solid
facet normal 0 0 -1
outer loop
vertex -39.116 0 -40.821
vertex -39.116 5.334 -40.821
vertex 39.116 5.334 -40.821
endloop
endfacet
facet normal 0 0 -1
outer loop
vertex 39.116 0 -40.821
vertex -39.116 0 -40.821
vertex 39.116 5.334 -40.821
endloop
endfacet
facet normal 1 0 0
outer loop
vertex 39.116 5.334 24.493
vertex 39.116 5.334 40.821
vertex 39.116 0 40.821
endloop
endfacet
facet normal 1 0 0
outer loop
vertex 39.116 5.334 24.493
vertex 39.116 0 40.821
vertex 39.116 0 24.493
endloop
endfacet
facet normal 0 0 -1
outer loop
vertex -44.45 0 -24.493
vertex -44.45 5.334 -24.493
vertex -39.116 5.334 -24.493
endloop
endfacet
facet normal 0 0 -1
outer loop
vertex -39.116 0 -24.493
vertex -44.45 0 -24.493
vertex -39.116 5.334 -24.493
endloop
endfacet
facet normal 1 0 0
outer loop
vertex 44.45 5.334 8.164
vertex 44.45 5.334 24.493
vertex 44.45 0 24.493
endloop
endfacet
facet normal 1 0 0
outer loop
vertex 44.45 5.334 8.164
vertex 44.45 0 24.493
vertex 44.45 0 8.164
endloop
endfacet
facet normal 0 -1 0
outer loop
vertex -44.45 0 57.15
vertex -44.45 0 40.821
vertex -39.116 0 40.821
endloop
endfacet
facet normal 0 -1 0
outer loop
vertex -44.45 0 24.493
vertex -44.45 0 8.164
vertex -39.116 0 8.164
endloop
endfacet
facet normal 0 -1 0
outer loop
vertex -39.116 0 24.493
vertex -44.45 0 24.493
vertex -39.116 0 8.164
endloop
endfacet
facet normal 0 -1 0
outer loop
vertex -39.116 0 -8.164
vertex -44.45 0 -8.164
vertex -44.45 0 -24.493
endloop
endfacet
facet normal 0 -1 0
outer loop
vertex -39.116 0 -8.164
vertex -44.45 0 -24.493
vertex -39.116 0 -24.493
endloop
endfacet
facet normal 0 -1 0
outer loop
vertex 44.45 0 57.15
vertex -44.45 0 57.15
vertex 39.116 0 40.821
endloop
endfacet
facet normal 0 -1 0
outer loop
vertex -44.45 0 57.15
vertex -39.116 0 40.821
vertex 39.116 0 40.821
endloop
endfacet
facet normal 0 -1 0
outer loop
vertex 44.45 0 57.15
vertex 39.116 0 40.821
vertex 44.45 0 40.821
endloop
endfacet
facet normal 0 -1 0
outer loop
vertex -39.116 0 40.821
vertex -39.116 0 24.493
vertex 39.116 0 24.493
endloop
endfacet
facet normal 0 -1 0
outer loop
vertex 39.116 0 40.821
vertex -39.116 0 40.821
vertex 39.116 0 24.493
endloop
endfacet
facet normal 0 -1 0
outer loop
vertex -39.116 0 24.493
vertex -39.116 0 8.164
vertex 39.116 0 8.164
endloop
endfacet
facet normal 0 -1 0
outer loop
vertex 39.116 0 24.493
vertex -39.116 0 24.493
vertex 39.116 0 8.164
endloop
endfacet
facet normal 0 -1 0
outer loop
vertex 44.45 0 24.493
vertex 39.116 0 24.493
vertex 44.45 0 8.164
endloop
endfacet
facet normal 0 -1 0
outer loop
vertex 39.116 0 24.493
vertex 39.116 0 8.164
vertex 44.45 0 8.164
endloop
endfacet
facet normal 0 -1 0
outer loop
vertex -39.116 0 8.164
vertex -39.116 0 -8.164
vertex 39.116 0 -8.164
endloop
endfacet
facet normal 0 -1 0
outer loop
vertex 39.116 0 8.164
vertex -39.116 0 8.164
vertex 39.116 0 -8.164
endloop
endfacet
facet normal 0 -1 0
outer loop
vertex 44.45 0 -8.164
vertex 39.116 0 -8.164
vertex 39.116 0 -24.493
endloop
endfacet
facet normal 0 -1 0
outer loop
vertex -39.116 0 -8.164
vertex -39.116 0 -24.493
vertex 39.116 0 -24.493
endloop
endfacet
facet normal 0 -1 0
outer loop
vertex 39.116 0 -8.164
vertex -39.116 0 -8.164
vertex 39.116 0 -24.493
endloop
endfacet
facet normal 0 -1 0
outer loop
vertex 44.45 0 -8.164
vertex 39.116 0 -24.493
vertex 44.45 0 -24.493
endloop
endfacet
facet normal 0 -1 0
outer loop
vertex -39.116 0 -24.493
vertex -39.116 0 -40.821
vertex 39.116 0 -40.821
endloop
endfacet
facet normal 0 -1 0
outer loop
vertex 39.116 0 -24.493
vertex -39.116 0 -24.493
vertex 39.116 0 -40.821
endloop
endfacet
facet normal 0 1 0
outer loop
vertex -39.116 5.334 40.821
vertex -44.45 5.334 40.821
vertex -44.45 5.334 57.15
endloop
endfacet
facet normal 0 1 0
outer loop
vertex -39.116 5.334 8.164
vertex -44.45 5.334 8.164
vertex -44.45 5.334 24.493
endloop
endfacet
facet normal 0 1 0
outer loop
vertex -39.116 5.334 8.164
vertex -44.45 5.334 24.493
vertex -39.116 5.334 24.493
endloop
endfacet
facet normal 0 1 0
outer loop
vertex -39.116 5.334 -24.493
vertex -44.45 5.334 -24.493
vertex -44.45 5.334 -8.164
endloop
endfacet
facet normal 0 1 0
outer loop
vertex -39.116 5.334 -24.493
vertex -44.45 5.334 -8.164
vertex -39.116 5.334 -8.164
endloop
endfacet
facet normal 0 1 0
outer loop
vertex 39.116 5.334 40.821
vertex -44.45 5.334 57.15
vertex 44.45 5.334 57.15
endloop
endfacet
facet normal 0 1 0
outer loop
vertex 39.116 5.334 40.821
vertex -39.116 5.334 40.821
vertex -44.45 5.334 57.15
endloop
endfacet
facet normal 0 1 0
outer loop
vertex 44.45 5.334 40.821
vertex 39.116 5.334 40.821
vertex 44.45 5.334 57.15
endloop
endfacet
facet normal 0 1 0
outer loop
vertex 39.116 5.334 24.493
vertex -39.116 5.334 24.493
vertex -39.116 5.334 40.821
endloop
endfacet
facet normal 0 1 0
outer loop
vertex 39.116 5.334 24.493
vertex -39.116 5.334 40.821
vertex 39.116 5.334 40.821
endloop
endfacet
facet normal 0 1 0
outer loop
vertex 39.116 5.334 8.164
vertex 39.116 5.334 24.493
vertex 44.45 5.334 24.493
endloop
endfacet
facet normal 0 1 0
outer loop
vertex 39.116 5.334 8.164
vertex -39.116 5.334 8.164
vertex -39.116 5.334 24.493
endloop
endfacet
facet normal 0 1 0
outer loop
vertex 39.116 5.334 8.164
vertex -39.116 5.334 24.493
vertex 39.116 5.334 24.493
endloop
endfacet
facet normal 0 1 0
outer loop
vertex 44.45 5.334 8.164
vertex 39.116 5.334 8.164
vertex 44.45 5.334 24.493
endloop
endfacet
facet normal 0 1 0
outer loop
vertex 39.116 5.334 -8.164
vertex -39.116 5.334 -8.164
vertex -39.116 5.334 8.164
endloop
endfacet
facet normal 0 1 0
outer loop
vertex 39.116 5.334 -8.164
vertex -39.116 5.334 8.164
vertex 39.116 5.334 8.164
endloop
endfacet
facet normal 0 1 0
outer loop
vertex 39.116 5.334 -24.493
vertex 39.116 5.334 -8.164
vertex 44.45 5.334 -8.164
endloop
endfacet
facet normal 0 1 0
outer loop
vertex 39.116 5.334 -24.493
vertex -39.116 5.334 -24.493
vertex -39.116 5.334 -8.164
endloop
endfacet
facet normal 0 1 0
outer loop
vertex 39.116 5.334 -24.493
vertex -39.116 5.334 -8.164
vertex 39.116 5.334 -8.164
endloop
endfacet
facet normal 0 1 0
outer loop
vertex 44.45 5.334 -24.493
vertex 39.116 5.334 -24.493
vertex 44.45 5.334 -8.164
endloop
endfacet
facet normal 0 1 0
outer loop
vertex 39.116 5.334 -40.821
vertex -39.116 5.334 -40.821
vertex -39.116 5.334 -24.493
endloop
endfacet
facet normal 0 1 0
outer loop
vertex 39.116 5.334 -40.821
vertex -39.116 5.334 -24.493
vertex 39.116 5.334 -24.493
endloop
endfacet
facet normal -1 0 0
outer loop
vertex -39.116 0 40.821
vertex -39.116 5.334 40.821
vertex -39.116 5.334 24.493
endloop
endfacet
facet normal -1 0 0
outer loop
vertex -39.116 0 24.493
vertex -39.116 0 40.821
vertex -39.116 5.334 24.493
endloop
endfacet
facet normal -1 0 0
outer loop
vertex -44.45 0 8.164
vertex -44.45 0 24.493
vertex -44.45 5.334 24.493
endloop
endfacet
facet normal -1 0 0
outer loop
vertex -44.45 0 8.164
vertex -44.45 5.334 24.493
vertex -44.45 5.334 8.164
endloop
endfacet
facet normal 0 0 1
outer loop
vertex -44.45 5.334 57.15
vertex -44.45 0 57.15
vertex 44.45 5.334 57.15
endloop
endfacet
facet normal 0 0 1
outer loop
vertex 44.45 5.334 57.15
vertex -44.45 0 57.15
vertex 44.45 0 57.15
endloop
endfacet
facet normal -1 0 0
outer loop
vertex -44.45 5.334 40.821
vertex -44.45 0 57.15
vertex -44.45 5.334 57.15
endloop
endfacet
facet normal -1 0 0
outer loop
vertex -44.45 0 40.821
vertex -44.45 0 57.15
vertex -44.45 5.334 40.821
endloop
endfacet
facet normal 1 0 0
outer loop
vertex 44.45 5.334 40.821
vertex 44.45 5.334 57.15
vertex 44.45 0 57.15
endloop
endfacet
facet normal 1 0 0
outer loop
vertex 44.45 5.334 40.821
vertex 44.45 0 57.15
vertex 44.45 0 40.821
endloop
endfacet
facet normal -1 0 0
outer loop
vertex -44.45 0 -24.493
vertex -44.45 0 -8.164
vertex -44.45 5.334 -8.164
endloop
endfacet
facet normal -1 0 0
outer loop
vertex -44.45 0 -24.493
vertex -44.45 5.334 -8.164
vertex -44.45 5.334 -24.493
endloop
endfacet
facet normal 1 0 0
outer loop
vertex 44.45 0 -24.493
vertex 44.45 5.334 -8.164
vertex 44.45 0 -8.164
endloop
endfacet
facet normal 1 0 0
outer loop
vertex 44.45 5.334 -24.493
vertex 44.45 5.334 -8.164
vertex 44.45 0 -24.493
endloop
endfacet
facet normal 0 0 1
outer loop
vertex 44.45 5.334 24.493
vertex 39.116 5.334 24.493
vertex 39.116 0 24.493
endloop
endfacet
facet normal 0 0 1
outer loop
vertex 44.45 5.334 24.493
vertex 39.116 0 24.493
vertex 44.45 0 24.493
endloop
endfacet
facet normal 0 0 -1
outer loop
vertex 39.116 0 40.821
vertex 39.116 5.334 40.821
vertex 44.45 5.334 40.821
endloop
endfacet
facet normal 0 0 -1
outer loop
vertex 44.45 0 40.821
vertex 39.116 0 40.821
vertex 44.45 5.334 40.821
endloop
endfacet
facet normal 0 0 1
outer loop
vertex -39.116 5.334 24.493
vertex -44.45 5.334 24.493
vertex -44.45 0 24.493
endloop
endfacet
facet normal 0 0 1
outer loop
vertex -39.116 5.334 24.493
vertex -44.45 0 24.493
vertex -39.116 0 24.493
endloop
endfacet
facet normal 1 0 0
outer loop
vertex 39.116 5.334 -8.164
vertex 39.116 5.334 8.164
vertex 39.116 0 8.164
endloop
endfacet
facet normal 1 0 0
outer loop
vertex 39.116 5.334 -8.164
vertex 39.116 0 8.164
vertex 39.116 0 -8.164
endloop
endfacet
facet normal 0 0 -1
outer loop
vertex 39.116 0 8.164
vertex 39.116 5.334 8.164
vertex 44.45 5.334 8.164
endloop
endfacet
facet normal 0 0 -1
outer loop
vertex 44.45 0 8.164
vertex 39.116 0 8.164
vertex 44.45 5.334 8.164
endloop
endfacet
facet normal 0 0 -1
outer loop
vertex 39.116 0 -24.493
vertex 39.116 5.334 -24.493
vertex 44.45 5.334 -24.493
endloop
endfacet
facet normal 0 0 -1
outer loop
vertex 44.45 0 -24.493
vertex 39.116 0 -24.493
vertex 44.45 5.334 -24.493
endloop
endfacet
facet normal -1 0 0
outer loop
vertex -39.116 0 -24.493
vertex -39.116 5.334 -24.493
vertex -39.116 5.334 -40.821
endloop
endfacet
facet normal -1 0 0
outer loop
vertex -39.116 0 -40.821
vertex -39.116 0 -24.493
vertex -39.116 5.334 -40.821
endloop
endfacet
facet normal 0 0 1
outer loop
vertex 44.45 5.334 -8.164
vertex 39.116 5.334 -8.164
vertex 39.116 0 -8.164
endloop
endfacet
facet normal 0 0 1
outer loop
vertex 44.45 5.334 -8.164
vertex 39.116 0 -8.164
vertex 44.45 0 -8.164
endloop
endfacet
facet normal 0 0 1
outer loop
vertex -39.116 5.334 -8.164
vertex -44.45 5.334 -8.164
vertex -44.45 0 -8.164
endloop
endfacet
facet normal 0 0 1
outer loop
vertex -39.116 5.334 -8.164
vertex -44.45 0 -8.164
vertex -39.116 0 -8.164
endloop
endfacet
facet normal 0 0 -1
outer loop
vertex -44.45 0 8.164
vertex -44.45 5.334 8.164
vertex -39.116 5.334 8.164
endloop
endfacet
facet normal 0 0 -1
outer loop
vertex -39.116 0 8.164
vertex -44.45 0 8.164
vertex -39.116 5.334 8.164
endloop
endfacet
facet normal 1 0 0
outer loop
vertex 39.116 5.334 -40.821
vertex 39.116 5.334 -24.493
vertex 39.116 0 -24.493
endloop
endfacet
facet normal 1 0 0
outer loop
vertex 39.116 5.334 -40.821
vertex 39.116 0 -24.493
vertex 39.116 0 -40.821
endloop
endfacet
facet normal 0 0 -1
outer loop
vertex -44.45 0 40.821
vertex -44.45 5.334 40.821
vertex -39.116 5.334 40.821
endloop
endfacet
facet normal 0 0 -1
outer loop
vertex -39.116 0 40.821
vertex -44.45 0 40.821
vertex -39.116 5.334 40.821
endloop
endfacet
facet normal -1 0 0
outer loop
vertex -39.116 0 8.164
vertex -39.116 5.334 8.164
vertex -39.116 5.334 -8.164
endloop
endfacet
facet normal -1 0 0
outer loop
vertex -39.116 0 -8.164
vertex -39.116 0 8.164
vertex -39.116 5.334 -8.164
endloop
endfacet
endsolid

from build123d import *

# Parameters (mm, degrees)
SKETCH1_W           = 88.9
SKETCH1_H           = 114.3
BOSS_EXTRUDE1_DEPTH = 5.334
SKETCH2_W           = 5.334
SKETCH2_H           = 16.328571428
CUT_EXTRUDE1_DEPTH  = 6.334
SKETCH2_2_W         = 5.334
SKETCH2_2_H         = 16.328571428
BOSS_EXTRUDE2_DEPTH = 5.334
SKETCH2_3_W         = 5.334
SKETCH2_3_H         = 16.328571428
CUT_EXTRUDE2_DEPTH  = 6.334
CUT_EXTRUDE3_DEPTH  = 6.334


with BuildPart() as part:
    # Sketch1 → Boss-Extrude1 (new body)
    with BuildSketch(Plane(origin=(0, 0, 0), x_dir=(1, 0, 0), z_dir=(0, 1, 0))):
        Rectangle(SKETCH1_W, SKETCH1_H)
    extrude(amount=BOSS_EXTRUDE1_DEPTH)

    # Sketch2 → Cut-Extrude1 (cut, through all)
    with BuildSketch(Plane(origin=(0, 5.334, 0), x_dir=(1, 0, 0), z_dir=(0, 1, 0))):
        with Locations((41.783, -32.657142857)):
            Rectangle(SKETCH2_W, SKETCH2_H)
        with Locations((41.783, 0)):
            Rectangle(SKETCH2_W, SKETCH2_H)
        with Locations((41.783, 32.657142857)):
            Rectangle(SKETCH2_W, SKETCH2_H)
        with Locations((-41.783, 32.657142857)):
            Rectangle(SKETCH2_W, SKETCH2_H)
        with Locations((-41.783, 0)):
            Rectangle(SKETCH2_W, SKETCH2_H)
        with Locations((-41.783, -32.657142857)):
            Rectangle(SKETCH2_W, SKETCH2_H)
    extrude(amount=-CUT_EXTRUDE1_DEPTH, mode=Mode.SUBTRACT)

    # Sketch2_2 → Boss-Extrude2 (add, through all)
    with BuildSketch(Plane(origin=(0, 5.334, 0), x_dir=(1, 0, 0), z_dir=(0, 1, 0))):
        with Locations((41.783, -32.657142857)):
            Rectangle(SKETCH2_2_W, SKETCH2_2_H)
        with Locations((41.783, 0)):
            Rectangle(SKETCH2_2_W, SKETCH2_2_H)
        with Locations((41.783, 32.657142857)):
            Rectangle(SKETCH2_2_W, SKETCH2_2_H)
        with Locations((-41.783, 32.657142857)):
            Rectangle(SKETCH2_2_W, SKETCH2_2_H)
        with Locations((-41.783, 0)):
            Rectangle(SKETCH2_2_W, SKETCH2_2_H)
        with Locations((-41.783, -32.657142857)):
            Rectangle(SKETCH2_2_W, SKETCH2_2_H)
    extrude(amount=-BOSS_EXTRUDE2_DEPTH)

    # Sketch2_3 → Cut-Extrude2 (cut, through all)
    with BuildSketch(Plane(origin=(0, 5.334, 0), x_dir=(1, 0, 0), z_dir=(0, 1, 0))):
        with Locations((41.783, -32.657142857)):
            Rectangle(SKETCH2_3_W, SKETCH2_3_H)
        with Locations((41.783, 0)):
            Rectangle(SKETCH2_3_W, SKETCH2_3_H)
        with Locations((41.783, 32.657142857)):
            Rectangle(SKETCH2_3_W, SKETCH2_3_H)
        with Locations((-41.783, 32.657142857)):
            Rectangle(SKETCH2_3_W, SKETCH2_3_H)
        with Locations((-41.783, 0)):
            Rectangle(SKETCH2_3_W, SKETCH2_3_H)
        with Locations((-41.783, -32.657142857)):
            Rectangle(SKETCH2_3_W, SKETCH2_3_H)
    extrude(amount=-CUT_EXTRUDE2_DEPTH, mode=Mode.SUBTRACT)

    # Sketch3 → Cut-Extrude3 (cut, through all)
    with BuildSketch(Plane(origin=(0, 5.334, 0), x_dir=(1, 0, 0), z_dir=(0, 1, 0))):
        Polygon((44.45, 40.821428571), (-39.116, 40.821428571), (-44.45, 40.821428571), (-44.45, 57.15), (44.45, 57.15), align=None)
    extrude(amount=-CUT_EXTRUDE3_DEPTH, mode=Mode.SUBTRACT)


solid = part.part
